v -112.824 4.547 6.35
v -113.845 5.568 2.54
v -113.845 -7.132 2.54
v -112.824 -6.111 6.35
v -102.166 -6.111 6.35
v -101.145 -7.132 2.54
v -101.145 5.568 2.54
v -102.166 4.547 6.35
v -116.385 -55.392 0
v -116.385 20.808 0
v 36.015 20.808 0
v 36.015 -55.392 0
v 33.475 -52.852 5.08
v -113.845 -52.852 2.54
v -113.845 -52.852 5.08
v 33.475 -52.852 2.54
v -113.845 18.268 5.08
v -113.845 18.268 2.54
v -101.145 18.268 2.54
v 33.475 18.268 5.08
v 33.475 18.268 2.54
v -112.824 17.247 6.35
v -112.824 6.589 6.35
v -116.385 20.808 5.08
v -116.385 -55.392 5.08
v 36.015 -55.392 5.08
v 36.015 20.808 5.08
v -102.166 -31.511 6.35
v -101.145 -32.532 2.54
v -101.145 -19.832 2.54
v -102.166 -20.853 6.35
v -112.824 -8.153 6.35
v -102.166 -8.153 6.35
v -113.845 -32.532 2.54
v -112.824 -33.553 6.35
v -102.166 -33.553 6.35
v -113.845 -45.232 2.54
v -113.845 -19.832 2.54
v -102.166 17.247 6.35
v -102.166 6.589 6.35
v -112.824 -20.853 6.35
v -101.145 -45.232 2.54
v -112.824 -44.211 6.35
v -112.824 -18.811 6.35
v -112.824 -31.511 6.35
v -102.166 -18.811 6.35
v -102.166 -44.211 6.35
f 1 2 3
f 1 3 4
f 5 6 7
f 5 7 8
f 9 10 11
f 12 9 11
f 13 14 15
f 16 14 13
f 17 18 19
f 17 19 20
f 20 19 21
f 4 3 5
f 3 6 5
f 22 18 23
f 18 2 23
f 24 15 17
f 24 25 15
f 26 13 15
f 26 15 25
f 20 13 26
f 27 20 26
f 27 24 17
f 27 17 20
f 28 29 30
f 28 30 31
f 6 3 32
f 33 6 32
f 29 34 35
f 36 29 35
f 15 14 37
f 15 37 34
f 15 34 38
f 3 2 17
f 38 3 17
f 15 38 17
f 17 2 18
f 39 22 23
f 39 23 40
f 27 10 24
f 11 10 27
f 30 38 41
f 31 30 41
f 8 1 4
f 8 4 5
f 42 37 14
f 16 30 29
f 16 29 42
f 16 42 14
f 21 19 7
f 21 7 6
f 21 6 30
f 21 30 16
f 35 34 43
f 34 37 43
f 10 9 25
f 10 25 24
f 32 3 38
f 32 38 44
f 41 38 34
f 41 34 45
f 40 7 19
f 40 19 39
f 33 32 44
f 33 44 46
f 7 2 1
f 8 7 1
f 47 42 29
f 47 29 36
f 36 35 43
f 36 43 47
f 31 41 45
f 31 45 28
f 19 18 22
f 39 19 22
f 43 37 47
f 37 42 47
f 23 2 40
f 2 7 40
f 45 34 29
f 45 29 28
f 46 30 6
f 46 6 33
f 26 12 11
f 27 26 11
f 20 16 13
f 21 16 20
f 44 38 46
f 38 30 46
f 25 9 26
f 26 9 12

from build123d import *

# Parameters (mm, degrees)
F0_W      = 152.4
F0_H      = 76.2
F1_DEPTH  = 5.08
F2_T      = -2.54
F3_W      = 12.7
F3_H      = 12.7
F4_DEPTH  = 3.81
F4_TAPER  = 15
F5_W      = 12.7
F5_H      = 12.7
F6_DEPTH  = 3.81
F6_TAPER  = 15
F7_W      = 12.7
F7_H      = 12.7
F8_DEPTH  = 3.81
F8_TAPER  = 15
F9_W      = 12.7
F9_H      = 12.7
F10_DEPTH = 3.81
F10_TAPER = 15
F11_W     = 12.7
F11_H     = 12.7
F13_DEPTH = 3.81
F13_TAPER = 15


with BuildPart() as f1:
    # F0 (on Top) → F1 (new body)
    with BuildSketch(Plane.XY):
        with Locations((-40.1846427969, -17.2922080383)):
            Rectangle(F0_W, F0_H)
    extrude(amount=F1_DEPTH)

    # F2
    f2_openings = [f1.faces().sort_by_distance(p)[0] for p in [
        (-40.184643, -17.292208, 5.08),
    ]]
    offset(amount=F2_T, openings=f2_openings)

    # F3 (on face) → F4 (join)
    with BuildSketch(Plane.XY.offset(2.54)):
        with Locations((-107.4946427969, 11.9177919617)):
            Rectangle(F3_W, F3_H)
    extrude(amount=F4_DEPTH, taper=F4_TAPER)

    # F5 (on face) → F6 (join)
    with BuildSketch(Plane.XY.offset(2.54)):
        with Locations((-107.4946427969, -0.7822080383)):
            Rectangle(F5_W, F5_H)
    extrude(amount=F6_DEPTH, taper=F6_TAPER)

    # F7 (on face) → F8 (join)
    with BuildSketch(Plane.XY.offset(2.54)):
        with Locations((-107.4946427969, -13.4822080383)):
            Rectangle(F7_W, F7_H)
    extrude(amount=F8_DEPTH, taper=F8_TAPER)

    # F9 (on face) → F10 (join)
    with BuildSketch(Plane.XY.offset(2.54)):
        with Locations((-107.4946427969, -26.1822080383)):
            Rectangle(F9_W, F9_H)
    extrude(amount=F10_DEPTH, taper=F10_TAPER)

    # F11 (on face) → F13 (join)
    with BuildSketch(Plane.XY.offset(2.54)):
        with Locations((-107.4946427969, -38.8822080383)):
            Rectangle(F11_W, F11_H)
    extrude(amount=F13_DEPTH, taper=F13_TAPER)


solid = f1.part
